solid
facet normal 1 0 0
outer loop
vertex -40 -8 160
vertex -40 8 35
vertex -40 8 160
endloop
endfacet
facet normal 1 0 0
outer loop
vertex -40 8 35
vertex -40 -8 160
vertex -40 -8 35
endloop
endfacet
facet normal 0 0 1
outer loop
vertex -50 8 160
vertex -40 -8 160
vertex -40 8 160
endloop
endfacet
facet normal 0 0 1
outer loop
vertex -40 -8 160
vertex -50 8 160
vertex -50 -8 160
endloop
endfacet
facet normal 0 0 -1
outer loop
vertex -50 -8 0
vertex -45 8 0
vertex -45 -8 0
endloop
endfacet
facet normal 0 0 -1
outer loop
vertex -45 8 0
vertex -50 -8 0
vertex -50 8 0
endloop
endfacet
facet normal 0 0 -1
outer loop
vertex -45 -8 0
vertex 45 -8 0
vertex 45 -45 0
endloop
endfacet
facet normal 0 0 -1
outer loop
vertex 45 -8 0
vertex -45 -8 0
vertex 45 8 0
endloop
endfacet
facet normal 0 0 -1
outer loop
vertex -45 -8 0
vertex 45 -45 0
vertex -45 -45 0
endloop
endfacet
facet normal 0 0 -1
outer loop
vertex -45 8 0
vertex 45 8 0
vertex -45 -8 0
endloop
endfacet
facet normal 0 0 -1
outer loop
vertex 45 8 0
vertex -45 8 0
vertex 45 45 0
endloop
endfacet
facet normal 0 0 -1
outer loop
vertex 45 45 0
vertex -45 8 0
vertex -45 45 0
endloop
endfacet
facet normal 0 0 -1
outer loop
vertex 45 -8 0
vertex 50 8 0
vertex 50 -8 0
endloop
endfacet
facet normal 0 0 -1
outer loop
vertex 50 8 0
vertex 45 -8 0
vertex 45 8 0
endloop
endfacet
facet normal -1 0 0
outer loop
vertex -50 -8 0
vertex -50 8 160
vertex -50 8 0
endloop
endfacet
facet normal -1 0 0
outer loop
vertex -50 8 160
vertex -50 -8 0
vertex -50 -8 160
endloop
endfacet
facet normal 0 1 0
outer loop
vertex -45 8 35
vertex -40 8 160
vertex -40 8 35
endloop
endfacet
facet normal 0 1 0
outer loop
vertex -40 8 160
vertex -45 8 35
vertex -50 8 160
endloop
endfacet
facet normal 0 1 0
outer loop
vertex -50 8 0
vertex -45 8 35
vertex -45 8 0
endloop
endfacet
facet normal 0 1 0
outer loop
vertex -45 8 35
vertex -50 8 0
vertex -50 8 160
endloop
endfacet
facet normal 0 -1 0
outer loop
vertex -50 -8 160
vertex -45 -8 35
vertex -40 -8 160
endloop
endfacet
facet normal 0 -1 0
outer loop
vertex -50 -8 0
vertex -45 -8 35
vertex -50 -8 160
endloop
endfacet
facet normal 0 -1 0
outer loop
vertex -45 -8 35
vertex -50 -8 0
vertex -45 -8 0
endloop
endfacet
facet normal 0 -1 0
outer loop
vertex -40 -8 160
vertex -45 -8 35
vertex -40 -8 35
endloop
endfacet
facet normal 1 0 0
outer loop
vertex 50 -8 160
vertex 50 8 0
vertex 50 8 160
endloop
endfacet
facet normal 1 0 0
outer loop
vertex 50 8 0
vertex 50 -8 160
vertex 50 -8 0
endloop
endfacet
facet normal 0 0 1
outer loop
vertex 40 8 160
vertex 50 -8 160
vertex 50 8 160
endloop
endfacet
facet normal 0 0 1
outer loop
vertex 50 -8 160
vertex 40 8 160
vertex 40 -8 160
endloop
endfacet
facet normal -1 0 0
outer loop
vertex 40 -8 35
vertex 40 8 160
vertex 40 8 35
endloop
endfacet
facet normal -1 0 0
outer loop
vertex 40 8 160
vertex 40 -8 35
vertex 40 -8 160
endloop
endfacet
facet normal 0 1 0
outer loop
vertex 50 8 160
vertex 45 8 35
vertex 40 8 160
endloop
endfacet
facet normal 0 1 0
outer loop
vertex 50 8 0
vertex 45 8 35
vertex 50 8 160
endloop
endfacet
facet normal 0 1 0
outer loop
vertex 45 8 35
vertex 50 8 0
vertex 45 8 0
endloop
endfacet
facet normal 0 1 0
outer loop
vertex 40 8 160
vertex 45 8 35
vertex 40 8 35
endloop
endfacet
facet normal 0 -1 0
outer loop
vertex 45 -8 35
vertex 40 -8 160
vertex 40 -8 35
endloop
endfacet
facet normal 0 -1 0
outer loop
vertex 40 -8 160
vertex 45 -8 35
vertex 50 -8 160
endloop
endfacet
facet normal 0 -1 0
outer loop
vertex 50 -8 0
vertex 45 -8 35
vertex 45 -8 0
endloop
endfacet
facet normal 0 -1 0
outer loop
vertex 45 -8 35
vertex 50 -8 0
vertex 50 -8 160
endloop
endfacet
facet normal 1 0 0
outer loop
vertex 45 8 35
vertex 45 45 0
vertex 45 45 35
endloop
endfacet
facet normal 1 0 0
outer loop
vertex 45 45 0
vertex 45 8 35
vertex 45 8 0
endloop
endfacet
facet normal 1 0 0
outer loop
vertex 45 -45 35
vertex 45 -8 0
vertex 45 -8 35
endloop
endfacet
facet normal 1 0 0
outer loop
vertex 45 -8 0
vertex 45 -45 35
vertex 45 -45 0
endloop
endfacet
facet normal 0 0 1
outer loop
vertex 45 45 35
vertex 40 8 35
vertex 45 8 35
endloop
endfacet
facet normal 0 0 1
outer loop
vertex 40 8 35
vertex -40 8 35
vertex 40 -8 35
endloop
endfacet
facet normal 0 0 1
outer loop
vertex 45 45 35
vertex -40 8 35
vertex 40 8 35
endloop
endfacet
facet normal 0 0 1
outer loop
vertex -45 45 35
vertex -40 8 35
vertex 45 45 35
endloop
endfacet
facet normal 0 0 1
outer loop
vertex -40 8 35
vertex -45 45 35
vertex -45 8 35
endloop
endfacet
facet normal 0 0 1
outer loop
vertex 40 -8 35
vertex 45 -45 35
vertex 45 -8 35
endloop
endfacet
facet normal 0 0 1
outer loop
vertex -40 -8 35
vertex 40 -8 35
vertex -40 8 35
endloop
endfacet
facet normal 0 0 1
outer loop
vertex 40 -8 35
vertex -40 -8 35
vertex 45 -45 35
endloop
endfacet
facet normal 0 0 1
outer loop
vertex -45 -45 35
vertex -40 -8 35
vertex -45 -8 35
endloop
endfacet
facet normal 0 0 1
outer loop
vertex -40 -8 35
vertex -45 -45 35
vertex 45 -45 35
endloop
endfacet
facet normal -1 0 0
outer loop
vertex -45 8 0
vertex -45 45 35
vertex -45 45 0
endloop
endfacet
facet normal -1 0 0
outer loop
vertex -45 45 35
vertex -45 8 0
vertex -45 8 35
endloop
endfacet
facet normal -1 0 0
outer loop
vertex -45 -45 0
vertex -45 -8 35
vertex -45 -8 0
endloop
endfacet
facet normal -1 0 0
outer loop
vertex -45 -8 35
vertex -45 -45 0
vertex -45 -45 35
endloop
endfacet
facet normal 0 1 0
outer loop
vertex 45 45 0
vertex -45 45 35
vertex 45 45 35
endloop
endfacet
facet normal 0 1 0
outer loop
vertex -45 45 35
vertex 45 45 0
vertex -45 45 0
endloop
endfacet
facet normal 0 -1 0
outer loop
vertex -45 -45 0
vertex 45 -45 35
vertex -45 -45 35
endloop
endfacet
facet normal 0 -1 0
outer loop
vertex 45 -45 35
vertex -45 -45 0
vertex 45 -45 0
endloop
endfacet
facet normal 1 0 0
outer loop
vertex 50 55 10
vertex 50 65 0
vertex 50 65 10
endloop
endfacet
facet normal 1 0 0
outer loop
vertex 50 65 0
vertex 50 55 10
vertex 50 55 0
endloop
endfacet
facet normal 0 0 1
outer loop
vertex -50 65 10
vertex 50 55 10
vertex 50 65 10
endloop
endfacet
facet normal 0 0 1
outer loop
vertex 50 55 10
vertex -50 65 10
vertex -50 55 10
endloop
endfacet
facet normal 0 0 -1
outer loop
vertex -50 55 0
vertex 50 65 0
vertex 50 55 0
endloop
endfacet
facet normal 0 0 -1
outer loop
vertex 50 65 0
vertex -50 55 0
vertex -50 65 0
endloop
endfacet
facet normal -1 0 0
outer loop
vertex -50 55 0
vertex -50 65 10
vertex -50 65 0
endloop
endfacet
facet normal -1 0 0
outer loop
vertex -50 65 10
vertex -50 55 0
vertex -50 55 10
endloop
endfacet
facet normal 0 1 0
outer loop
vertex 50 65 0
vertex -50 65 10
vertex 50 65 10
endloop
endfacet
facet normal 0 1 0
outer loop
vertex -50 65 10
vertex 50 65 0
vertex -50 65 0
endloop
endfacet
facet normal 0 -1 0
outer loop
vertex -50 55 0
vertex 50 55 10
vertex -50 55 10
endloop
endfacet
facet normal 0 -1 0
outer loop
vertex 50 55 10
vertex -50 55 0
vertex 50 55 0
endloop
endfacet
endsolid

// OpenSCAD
// =====================================================================
// 4x 50 mL conical tube carrier, printed as two parts side by side.
// Part 1: base block + two posts (posts have square through-holes).
// Part 2: square handle bar (pushed through both posts after printing).
// Units: mm.  Print orientation: parts rest on XY plane (z = 0), +Z up.
// =====================================================================

$fn = 64;

// ---------------- Part 1 : base block ----------------
base_w   = 90;   // X extent of base block
base_d   = 90;   // Y extent of base block
base_h   = 35;   // Z height of base block

// Blind tube seats (50 mL conical tubes)
seat_d   = 30.5; // seat diameter
seat_dep = 30;   // seat depth (leaves a 5 mm floor)
seat_x   = [-21, 21];   // X centres of the four seats
seat_y   = [-24, 24];   // Y centres of the four seats

// ---------------- Part 1 : posts ----------------
post_t   = 10;   // post thickness along X
post_w   = 16;   // post width along Y
post_h   = 160;  // post height (z = 0 .. 160)
post_x   = [-45, 45]; // X centres (flush with the two X end faces)
post_hole = 10.4;     // square through-hole size (X x Y)
post_hole_z = 150;    // Z centre of the square hole

// ---------------- Part 2 : handle bar ----------------
bar_s    = 10;   // square bar cross-section (X x Y)
bar_len  = 100;  // bar length along X
bar_y0   = 55;   // bar Y start (10 mm gap to the base +Y face at y = 45)
bar_y1   = 65;   // bar Y end

// =====================================================================
// PART 1  (base + posts, centred on the origin in X and Y)
// =====================================================================
part1();

// =====================================================================
// PART 2  (handle bar, offset in +Y so it prints beside part 1)
// =====================================================================
part2();

// ---------------------------------------------------------------------
// Part 1 : base block with four blind seats, plus two posts with square
//          through-holes.  Posts are unioned onto the base, then the
//          square holes are cut (cutters extend 1 mm past each face).
// ---------------------------------------------------------------------
module part1() {
    union() {
        // --- base block ---
        translate([-base_w/2, -base_d/2, 0])
            cube([base_w, base_d, base_h]);

        // --- four blind tube seats (cut from the base) ---
        for (sx = seat_x)
            for (sy = seat_y)
                difference() {
                    // (seat cutters are applied to the base below)
                }

        // --- two posts (unioned onto the base) ---
        for (px = post_x)
            translate([px - post_t/2, -post_w/2, 0])
                cube([post_t, post_w, post_h]);
    }

    // Apply the seat and post-hole cuts to the whole part-1 solid.
    difference() {
        // (the union above is re-declared here so the cuts apply to it)
        union() {
            translate([-base_w/2, -base_d/2, 0])
                cube([base_w, base_d, base_h]);

            for (px = post_x)
                translate([px - post_t/2, -post_w/2, 0])
                    cube([post_t, post_w, post_h]);
        }

        // four blind seats, cut 1 mm past the top face (z = 35)
        for (sx = seat_x)
            for (sy = seat_y)
                translate([sx, sy, 0])
                    cylinder(h = seat_dep + 1, d = seat_d, $fn = 64);

        // square through-holes in the two posts, cut 1 mm past each face
        for (px = post_x)
            translate([px - post_t/2 - 1,
                       post_hole_z - post_hole/2,
                       post_hole_z - post_hole/2])
                cube([post_t + 2, post_hole, post_hole]);
    }
}

// ---------------------------------------------------------------------
// Part 2 : square handle bar lying on the bed along X, centred on x = 0,
//          spanning y = 55 .. 65 (10 mm gap to the base +Y face).
// ---------------------------------------------------------------------
module part2() {
    translate([-bar_len/2, bar_y0, 0])
        cube([bar_len, bar_s, bar_s]);
}
